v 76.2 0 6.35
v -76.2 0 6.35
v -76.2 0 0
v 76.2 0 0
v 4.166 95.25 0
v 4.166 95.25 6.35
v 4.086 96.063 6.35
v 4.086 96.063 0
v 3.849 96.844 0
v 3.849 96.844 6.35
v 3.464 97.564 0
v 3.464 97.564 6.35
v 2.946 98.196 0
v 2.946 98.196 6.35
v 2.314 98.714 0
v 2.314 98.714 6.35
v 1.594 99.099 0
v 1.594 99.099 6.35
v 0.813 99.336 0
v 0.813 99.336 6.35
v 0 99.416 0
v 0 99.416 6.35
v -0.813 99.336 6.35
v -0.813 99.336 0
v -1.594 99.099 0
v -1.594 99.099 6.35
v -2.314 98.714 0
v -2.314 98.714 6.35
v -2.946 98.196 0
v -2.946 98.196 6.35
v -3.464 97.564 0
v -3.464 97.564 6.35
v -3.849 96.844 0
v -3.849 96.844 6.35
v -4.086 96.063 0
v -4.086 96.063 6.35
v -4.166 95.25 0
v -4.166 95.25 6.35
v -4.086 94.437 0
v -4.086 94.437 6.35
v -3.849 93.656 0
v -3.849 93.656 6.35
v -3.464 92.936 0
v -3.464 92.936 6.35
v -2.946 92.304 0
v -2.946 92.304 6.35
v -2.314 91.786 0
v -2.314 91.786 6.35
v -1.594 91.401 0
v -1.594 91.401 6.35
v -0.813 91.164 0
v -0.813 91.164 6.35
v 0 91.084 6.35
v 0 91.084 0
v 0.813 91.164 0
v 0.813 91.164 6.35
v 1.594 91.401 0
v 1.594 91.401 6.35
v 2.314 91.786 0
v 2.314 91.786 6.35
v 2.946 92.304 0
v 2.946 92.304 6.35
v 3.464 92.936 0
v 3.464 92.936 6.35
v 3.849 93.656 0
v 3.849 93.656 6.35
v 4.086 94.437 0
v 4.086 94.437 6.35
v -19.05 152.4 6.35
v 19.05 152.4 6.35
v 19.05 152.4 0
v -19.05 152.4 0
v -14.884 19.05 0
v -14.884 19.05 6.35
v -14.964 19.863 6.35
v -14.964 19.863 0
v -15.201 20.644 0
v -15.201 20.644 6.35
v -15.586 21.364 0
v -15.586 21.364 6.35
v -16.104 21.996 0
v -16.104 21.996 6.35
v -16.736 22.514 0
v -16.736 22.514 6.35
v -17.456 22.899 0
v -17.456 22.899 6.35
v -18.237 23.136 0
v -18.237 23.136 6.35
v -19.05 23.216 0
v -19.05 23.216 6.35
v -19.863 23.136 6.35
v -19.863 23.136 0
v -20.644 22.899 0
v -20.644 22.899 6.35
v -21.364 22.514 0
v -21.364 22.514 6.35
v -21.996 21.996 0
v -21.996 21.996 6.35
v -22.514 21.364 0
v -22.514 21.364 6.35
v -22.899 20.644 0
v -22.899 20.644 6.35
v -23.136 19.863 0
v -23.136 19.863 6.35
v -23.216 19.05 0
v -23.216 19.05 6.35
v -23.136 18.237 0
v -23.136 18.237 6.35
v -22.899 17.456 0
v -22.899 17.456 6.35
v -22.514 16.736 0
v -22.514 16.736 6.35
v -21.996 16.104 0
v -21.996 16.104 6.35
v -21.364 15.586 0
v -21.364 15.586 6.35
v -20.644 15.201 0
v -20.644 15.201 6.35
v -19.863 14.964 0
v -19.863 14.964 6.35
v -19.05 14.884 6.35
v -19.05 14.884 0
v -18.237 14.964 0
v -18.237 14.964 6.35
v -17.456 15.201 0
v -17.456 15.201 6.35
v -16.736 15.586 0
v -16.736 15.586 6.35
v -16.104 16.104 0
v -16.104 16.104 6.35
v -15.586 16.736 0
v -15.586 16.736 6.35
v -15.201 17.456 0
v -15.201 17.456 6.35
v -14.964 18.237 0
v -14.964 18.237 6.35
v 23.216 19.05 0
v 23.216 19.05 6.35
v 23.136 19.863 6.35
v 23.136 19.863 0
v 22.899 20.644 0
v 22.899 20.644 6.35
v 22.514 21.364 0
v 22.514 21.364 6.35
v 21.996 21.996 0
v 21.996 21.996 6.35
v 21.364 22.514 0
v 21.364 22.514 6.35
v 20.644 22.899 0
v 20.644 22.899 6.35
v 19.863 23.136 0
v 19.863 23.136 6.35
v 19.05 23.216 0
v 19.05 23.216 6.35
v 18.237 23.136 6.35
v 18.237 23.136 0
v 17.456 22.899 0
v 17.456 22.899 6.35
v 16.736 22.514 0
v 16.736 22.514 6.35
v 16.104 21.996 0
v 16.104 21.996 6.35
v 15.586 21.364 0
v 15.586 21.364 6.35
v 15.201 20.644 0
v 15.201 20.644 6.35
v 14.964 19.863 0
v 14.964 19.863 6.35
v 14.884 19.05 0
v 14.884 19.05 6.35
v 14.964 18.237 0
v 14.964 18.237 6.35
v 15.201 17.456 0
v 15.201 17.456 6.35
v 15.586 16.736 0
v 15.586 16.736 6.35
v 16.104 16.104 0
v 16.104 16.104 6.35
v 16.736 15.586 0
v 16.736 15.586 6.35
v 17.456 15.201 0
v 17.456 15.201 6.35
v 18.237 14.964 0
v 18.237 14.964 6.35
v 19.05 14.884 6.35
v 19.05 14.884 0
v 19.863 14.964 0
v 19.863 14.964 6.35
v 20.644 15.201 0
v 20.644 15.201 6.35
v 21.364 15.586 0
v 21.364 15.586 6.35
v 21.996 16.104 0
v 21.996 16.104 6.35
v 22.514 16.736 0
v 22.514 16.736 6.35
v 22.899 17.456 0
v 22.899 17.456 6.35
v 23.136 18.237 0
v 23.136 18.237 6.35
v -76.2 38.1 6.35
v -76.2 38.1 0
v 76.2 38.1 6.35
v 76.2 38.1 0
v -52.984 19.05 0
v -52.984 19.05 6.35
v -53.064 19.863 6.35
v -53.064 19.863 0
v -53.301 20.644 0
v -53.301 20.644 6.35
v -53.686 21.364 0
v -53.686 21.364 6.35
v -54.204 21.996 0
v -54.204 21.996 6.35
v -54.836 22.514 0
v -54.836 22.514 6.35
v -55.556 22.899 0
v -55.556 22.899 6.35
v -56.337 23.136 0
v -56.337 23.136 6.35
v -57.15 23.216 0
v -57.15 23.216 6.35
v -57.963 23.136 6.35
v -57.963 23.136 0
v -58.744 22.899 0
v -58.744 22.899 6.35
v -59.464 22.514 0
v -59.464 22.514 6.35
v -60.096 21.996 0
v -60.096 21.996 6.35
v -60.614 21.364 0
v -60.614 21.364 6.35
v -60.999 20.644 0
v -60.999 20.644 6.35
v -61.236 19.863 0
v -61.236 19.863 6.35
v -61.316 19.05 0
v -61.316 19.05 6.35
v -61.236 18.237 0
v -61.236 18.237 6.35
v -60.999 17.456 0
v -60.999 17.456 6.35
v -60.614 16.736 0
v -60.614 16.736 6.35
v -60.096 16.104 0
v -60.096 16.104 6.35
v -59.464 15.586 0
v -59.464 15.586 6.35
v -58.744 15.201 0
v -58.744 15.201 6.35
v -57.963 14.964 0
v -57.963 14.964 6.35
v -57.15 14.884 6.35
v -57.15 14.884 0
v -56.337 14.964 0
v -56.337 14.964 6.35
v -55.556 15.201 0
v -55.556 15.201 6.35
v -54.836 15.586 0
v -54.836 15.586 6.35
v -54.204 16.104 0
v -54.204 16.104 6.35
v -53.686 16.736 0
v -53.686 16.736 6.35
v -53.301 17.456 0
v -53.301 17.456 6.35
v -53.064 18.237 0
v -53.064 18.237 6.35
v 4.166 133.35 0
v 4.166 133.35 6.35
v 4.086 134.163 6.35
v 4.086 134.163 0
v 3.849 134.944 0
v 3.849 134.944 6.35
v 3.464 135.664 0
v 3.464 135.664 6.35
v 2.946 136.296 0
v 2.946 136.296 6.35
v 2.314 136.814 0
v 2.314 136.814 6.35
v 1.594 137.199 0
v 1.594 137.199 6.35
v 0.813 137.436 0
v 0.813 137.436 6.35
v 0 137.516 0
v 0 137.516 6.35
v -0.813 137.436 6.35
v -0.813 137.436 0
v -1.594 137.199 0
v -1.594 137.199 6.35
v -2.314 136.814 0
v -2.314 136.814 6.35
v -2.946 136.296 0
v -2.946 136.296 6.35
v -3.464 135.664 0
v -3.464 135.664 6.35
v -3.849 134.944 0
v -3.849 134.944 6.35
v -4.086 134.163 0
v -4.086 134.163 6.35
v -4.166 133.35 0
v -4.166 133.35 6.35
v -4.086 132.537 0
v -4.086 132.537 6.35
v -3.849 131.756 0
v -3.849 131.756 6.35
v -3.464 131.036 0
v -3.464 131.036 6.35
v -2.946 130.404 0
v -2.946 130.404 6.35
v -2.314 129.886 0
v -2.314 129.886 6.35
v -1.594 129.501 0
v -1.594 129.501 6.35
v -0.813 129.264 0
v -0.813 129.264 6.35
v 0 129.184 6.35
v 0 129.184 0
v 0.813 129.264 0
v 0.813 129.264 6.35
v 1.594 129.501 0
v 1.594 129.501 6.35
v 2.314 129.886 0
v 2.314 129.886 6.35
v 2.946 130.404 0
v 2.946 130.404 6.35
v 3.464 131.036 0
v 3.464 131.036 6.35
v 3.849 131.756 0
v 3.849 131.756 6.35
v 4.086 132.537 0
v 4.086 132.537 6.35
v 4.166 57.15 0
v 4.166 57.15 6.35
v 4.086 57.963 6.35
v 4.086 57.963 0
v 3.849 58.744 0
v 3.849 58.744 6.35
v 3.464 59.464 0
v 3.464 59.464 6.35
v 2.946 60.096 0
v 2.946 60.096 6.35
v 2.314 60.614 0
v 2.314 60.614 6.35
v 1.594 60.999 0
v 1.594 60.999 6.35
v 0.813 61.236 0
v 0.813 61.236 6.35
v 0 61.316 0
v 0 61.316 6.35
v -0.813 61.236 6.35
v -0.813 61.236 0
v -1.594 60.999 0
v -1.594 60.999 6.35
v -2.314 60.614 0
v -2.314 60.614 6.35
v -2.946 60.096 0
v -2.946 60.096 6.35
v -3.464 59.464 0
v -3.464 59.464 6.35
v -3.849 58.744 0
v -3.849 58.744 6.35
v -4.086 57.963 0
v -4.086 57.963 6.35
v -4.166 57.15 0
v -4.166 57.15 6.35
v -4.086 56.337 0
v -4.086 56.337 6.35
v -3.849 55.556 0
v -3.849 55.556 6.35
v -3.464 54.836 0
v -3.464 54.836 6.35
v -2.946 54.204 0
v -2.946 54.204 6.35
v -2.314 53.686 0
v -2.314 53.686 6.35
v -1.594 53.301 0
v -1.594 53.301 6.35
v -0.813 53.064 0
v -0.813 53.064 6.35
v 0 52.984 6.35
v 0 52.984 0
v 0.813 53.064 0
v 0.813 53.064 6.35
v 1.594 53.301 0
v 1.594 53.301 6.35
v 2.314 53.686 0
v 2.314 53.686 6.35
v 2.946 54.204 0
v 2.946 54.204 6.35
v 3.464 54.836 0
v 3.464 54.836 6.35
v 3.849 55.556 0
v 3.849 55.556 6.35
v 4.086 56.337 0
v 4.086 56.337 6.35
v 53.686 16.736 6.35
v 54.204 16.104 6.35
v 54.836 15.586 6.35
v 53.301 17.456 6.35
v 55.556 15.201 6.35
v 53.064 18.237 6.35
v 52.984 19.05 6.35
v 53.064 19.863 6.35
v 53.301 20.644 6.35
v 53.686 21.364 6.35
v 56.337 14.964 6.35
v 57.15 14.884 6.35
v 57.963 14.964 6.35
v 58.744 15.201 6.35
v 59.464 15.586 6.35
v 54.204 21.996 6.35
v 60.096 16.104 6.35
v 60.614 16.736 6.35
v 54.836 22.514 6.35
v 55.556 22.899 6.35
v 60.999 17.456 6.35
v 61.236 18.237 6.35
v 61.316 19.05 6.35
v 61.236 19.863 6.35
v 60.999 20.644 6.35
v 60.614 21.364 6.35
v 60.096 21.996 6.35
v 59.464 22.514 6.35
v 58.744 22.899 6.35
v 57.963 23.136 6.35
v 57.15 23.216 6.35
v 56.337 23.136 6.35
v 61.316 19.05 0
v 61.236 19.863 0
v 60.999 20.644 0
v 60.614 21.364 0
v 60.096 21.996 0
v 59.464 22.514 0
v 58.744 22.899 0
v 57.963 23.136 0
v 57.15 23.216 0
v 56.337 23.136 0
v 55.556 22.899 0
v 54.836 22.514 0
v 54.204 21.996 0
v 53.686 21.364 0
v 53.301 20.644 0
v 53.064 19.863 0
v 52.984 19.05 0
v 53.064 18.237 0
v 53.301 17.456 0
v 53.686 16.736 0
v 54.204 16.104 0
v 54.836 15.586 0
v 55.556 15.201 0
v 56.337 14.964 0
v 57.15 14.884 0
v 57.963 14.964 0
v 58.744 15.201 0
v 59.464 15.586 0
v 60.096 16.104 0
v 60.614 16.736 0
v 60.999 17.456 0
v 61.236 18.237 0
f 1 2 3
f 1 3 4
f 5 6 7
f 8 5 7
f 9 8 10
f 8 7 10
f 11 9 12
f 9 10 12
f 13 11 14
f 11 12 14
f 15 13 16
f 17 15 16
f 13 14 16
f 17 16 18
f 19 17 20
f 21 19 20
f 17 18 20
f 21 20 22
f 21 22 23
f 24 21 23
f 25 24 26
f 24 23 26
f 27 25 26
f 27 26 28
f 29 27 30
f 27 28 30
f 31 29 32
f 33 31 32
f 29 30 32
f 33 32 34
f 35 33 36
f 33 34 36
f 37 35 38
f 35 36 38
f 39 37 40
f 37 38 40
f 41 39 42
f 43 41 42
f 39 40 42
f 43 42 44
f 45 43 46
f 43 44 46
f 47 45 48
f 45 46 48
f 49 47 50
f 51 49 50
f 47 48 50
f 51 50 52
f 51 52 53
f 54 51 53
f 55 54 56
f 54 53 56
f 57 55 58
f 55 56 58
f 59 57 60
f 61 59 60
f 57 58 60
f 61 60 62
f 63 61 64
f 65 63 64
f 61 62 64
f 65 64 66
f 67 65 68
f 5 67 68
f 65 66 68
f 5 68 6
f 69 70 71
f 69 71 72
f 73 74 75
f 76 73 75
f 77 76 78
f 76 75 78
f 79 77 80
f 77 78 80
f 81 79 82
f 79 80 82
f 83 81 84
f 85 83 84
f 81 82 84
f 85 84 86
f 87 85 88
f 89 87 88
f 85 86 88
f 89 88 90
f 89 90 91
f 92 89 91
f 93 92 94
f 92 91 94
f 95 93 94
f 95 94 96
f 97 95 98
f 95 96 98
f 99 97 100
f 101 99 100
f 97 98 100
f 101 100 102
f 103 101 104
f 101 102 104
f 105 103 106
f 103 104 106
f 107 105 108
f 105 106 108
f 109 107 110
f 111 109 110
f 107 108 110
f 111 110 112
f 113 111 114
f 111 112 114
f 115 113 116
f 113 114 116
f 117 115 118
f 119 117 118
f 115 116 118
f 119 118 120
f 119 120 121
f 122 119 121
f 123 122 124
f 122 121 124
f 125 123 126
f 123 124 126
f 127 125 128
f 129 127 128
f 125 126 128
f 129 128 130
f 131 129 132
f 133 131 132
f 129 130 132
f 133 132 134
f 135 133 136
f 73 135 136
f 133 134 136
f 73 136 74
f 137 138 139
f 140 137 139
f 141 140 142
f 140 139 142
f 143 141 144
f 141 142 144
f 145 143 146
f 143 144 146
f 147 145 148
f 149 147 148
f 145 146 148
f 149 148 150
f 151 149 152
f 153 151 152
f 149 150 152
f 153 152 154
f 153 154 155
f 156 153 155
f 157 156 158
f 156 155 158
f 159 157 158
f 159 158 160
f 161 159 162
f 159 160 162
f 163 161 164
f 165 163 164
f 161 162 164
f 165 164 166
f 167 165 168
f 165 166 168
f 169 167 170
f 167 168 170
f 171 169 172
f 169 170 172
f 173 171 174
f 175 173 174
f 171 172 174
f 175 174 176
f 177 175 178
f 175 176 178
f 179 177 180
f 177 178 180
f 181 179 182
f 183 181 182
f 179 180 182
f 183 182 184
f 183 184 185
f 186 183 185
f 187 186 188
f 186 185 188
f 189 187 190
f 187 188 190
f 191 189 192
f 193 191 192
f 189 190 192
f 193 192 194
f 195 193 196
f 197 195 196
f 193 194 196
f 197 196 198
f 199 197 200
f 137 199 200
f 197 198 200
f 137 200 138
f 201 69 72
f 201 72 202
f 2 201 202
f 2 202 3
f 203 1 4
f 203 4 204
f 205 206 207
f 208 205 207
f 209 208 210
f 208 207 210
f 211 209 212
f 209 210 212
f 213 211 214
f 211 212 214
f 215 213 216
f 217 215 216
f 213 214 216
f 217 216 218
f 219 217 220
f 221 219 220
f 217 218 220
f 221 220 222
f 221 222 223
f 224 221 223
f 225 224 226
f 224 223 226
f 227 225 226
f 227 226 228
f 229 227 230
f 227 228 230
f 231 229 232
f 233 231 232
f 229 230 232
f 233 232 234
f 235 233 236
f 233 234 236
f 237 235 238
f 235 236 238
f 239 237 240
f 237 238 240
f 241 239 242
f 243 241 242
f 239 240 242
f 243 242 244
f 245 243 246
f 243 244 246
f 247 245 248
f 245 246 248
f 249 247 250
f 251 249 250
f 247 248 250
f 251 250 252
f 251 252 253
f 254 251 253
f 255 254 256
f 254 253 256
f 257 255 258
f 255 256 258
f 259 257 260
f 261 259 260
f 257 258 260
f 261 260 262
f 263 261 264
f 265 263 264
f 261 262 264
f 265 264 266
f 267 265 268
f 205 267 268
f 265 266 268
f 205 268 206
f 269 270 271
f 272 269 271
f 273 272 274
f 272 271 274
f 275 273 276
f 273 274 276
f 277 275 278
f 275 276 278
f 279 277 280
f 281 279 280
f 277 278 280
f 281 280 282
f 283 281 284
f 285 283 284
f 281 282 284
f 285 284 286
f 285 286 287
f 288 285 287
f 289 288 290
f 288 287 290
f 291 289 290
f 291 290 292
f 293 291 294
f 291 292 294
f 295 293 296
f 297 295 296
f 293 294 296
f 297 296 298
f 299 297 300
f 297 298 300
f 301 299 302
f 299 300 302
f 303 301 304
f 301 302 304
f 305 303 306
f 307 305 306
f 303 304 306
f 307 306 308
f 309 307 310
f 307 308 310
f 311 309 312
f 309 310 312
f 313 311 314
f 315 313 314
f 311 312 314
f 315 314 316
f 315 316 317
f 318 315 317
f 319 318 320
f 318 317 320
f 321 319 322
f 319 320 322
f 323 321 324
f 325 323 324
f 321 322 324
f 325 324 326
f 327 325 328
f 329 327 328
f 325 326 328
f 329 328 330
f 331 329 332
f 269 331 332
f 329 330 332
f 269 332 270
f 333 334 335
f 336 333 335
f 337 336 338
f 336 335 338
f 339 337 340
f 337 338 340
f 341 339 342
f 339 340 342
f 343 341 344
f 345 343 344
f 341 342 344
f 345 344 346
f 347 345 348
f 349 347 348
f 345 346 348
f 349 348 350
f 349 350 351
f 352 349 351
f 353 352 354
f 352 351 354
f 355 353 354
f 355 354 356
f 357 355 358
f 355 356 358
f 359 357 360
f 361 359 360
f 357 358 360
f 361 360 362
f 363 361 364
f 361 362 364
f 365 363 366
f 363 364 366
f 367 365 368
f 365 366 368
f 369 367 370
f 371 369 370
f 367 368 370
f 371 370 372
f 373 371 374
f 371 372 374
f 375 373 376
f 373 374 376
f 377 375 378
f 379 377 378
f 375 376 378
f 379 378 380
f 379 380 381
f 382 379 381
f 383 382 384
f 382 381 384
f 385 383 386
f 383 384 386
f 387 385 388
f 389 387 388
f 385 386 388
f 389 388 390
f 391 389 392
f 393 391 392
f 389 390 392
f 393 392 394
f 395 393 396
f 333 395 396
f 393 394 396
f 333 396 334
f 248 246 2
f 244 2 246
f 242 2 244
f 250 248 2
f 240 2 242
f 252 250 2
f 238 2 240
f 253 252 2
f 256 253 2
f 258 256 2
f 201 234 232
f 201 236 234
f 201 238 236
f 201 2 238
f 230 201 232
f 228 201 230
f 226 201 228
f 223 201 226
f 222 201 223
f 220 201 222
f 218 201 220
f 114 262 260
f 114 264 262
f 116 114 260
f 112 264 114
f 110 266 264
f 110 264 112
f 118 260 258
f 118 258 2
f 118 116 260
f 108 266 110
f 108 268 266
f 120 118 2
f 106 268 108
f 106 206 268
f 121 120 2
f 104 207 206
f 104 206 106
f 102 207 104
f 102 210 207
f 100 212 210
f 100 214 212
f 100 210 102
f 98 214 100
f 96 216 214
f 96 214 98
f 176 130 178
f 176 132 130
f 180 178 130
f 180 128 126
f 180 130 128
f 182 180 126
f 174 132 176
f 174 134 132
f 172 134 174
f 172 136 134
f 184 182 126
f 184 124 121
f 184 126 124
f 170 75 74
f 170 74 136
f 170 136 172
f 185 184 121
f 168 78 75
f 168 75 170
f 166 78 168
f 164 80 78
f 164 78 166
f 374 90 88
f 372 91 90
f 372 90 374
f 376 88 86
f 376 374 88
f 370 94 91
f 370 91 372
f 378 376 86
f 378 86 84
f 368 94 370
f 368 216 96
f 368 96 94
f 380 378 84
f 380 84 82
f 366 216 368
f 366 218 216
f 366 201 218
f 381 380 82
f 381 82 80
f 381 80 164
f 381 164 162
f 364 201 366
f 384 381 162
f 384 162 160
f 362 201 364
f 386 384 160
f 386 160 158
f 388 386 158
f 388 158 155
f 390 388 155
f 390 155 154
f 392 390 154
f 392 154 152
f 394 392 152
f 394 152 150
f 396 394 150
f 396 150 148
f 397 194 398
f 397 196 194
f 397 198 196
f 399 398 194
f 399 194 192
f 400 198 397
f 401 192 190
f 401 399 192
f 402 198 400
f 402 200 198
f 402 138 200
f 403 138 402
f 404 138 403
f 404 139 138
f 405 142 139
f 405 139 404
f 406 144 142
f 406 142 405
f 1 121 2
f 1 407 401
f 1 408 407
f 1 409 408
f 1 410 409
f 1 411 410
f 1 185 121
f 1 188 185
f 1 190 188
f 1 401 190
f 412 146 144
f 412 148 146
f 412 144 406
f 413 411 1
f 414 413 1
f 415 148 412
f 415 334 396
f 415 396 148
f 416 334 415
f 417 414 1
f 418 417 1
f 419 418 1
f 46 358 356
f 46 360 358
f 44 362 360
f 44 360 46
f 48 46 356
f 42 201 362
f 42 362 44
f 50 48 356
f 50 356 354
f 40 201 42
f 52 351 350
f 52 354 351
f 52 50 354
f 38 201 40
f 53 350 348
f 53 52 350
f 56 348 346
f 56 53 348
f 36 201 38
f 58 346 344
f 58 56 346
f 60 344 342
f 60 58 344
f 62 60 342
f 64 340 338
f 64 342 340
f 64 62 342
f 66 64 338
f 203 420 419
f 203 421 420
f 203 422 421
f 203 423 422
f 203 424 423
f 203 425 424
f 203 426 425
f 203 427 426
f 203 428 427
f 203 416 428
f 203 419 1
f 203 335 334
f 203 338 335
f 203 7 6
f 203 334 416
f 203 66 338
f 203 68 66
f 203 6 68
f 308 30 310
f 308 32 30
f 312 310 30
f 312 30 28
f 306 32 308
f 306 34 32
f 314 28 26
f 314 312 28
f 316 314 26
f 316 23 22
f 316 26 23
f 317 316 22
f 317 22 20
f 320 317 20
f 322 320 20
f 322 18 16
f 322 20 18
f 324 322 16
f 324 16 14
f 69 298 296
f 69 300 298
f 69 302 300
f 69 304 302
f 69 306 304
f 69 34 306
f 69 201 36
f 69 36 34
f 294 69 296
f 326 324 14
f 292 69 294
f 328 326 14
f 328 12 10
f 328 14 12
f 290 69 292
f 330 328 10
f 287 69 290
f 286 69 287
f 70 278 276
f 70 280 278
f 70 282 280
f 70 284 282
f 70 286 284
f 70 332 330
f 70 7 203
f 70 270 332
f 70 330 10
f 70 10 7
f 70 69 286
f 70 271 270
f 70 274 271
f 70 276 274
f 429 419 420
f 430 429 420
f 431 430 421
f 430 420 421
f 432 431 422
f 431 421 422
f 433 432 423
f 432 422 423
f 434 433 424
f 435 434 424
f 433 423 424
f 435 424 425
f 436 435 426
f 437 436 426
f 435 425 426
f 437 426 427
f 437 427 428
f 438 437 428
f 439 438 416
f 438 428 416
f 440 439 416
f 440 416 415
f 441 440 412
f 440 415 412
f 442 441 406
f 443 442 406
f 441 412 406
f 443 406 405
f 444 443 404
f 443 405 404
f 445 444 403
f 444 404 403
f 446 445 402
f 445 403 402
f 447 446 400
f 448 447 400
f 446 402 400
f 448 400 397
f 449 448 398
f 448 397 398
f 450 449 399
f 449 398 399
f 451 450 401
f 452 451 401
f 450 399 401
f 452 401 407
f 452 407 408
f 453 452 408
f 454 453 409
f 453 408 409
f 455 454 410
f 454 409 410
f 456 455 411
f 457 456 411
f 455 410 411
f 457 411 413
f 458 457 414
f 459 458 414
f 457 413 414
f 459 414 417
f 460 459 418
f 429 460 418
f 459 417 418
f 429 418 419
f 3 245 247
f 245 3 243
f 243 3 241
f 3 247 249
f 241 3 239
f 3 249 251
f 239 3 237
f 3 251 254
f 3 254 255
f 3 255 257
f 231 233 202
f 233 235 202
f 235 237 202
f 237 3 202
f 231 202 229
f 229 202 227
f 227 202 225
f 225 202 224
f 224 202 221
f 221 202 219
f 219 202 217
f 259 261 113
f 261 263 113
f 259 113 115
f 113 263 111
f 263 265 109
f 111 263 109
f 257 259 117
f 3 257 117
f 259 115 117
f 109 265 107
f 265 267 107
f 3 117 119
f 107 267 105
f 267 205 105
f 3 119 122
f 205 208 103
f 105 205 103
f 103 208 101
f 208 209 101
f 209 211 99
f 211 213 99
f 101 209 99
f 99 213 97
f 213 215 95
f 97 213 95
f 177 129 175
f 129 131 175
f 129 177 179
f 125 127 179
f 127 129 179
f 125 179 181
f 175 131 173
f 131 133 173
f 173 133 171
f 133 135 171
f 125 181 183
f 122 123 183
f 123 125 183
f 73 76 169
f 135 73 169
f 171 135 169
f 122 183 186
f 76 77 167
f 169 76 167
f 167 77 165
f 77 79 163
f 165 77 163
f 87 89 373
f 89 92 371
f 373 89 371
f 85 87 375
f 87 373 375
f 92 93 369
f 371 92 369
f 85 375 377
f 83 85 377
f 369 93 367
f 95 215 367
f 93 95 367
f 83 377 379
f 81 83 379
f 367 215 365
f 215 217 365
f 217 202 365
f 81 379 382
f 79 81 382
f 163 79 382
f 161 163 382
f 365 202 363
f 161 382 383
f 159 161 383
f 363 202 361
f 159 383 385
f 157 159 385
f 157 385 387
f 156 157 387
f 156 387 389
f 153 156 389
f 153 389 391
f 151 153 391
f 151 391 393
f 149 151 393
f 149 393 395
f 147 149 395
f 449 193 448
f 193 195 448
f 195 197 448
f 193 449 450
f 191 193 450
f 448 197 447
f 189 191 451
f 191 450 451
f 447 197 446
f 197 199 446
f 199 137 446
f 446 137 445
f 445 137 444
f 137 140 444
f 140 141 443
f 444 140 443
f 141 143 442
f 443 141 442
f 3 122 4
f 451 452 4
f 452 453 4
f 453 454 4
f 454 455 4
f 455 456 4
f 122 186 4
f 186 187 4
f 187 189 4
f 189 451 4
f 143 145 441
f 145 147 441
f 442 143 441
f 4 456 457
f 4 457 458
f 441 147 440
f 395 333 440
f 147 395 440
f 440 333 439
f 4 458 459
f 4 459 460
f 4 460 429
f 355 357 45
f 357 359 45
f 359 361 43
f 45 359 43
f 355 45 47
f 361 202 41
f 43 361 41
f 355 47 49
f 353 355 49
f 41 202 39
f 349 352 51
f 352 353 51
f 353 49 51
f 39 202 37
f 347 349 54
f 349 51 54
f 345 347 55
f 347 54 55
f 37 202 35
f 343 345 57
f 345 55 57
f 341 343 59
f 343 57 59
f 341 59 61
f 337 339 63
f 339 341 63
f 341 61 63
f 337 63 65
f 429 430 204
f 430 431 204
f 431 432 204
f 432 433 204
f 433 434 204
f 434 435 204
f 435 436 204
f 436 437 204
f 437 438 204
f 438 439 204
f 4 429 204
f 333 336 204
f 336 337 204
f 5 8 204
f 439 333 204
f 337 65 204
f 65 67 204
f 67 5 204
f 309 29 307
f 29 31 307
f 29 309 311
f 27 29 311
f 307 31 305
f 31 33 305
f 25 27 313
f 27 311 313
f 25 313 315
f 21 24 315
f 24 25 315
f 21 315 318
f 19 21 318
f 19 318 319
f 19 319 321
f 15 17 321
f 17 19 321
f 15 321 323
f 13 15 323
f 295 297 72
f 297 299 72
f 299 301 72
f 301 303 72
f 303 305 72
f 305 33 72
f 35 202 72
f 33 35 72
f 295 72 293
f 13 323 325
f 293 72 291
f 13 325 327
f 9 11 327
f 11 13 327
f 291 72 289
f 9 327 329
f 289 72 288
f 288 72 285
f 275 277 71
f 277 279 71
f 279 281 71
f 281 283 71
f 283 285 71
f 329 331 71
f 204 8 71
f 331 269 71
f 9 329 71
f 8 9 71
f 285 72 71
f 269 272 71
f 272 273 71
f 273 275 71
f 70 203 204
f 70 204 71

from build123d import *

# Parameters (mm, degrees)
SKETCH1_R           = 4.1656
BOSS_EXTRUDE1_DEPTH = 6.35


with BuildPart() as part:
    # Sketch1 → Boss-Extrude1 (new body)
    with BuildSketch(Plane.XY.offset(6.35)):
        Polygon((-19.05, 152.4), (-76.2, 38.1), (-76.2, 0), (76.2, 0), (76.2, 38.1), (19.05, 152.4), align=None)
        with Locations((-57.15, 19.05)):
            Circle(SKETCH1_R, mode=Mode.SUBTRACT)
        with Locations((-19.05, 19.05)):
            Circle(SKETCH1_R, mode=Mode.SUBTRACT)
        with Locations((0, 133.35)):
            Circle(SKETCH1_R, mode=Mode.SUBTRACT)
        with Locations((0, 95.25)):
            Circle(SKETCH1_R, mode=Mode.SUBTRACT)
        with Locations((0, 57.15)):
            Circle(SKETCH1_R, mode=Mode.SUBTRACT)
        with Locations((19.05, 19.05)):
            Circle(SKETCH1_R, mode=Mode.SUBTRACT)
        with Locations((57.15, 19.05)):
            Circle(SKETCH1_R, mode=Mode.SUBTRACT)
    extrude(amount=-BOSS_EXTRUDE1_DEPTH)


solid = part.part
